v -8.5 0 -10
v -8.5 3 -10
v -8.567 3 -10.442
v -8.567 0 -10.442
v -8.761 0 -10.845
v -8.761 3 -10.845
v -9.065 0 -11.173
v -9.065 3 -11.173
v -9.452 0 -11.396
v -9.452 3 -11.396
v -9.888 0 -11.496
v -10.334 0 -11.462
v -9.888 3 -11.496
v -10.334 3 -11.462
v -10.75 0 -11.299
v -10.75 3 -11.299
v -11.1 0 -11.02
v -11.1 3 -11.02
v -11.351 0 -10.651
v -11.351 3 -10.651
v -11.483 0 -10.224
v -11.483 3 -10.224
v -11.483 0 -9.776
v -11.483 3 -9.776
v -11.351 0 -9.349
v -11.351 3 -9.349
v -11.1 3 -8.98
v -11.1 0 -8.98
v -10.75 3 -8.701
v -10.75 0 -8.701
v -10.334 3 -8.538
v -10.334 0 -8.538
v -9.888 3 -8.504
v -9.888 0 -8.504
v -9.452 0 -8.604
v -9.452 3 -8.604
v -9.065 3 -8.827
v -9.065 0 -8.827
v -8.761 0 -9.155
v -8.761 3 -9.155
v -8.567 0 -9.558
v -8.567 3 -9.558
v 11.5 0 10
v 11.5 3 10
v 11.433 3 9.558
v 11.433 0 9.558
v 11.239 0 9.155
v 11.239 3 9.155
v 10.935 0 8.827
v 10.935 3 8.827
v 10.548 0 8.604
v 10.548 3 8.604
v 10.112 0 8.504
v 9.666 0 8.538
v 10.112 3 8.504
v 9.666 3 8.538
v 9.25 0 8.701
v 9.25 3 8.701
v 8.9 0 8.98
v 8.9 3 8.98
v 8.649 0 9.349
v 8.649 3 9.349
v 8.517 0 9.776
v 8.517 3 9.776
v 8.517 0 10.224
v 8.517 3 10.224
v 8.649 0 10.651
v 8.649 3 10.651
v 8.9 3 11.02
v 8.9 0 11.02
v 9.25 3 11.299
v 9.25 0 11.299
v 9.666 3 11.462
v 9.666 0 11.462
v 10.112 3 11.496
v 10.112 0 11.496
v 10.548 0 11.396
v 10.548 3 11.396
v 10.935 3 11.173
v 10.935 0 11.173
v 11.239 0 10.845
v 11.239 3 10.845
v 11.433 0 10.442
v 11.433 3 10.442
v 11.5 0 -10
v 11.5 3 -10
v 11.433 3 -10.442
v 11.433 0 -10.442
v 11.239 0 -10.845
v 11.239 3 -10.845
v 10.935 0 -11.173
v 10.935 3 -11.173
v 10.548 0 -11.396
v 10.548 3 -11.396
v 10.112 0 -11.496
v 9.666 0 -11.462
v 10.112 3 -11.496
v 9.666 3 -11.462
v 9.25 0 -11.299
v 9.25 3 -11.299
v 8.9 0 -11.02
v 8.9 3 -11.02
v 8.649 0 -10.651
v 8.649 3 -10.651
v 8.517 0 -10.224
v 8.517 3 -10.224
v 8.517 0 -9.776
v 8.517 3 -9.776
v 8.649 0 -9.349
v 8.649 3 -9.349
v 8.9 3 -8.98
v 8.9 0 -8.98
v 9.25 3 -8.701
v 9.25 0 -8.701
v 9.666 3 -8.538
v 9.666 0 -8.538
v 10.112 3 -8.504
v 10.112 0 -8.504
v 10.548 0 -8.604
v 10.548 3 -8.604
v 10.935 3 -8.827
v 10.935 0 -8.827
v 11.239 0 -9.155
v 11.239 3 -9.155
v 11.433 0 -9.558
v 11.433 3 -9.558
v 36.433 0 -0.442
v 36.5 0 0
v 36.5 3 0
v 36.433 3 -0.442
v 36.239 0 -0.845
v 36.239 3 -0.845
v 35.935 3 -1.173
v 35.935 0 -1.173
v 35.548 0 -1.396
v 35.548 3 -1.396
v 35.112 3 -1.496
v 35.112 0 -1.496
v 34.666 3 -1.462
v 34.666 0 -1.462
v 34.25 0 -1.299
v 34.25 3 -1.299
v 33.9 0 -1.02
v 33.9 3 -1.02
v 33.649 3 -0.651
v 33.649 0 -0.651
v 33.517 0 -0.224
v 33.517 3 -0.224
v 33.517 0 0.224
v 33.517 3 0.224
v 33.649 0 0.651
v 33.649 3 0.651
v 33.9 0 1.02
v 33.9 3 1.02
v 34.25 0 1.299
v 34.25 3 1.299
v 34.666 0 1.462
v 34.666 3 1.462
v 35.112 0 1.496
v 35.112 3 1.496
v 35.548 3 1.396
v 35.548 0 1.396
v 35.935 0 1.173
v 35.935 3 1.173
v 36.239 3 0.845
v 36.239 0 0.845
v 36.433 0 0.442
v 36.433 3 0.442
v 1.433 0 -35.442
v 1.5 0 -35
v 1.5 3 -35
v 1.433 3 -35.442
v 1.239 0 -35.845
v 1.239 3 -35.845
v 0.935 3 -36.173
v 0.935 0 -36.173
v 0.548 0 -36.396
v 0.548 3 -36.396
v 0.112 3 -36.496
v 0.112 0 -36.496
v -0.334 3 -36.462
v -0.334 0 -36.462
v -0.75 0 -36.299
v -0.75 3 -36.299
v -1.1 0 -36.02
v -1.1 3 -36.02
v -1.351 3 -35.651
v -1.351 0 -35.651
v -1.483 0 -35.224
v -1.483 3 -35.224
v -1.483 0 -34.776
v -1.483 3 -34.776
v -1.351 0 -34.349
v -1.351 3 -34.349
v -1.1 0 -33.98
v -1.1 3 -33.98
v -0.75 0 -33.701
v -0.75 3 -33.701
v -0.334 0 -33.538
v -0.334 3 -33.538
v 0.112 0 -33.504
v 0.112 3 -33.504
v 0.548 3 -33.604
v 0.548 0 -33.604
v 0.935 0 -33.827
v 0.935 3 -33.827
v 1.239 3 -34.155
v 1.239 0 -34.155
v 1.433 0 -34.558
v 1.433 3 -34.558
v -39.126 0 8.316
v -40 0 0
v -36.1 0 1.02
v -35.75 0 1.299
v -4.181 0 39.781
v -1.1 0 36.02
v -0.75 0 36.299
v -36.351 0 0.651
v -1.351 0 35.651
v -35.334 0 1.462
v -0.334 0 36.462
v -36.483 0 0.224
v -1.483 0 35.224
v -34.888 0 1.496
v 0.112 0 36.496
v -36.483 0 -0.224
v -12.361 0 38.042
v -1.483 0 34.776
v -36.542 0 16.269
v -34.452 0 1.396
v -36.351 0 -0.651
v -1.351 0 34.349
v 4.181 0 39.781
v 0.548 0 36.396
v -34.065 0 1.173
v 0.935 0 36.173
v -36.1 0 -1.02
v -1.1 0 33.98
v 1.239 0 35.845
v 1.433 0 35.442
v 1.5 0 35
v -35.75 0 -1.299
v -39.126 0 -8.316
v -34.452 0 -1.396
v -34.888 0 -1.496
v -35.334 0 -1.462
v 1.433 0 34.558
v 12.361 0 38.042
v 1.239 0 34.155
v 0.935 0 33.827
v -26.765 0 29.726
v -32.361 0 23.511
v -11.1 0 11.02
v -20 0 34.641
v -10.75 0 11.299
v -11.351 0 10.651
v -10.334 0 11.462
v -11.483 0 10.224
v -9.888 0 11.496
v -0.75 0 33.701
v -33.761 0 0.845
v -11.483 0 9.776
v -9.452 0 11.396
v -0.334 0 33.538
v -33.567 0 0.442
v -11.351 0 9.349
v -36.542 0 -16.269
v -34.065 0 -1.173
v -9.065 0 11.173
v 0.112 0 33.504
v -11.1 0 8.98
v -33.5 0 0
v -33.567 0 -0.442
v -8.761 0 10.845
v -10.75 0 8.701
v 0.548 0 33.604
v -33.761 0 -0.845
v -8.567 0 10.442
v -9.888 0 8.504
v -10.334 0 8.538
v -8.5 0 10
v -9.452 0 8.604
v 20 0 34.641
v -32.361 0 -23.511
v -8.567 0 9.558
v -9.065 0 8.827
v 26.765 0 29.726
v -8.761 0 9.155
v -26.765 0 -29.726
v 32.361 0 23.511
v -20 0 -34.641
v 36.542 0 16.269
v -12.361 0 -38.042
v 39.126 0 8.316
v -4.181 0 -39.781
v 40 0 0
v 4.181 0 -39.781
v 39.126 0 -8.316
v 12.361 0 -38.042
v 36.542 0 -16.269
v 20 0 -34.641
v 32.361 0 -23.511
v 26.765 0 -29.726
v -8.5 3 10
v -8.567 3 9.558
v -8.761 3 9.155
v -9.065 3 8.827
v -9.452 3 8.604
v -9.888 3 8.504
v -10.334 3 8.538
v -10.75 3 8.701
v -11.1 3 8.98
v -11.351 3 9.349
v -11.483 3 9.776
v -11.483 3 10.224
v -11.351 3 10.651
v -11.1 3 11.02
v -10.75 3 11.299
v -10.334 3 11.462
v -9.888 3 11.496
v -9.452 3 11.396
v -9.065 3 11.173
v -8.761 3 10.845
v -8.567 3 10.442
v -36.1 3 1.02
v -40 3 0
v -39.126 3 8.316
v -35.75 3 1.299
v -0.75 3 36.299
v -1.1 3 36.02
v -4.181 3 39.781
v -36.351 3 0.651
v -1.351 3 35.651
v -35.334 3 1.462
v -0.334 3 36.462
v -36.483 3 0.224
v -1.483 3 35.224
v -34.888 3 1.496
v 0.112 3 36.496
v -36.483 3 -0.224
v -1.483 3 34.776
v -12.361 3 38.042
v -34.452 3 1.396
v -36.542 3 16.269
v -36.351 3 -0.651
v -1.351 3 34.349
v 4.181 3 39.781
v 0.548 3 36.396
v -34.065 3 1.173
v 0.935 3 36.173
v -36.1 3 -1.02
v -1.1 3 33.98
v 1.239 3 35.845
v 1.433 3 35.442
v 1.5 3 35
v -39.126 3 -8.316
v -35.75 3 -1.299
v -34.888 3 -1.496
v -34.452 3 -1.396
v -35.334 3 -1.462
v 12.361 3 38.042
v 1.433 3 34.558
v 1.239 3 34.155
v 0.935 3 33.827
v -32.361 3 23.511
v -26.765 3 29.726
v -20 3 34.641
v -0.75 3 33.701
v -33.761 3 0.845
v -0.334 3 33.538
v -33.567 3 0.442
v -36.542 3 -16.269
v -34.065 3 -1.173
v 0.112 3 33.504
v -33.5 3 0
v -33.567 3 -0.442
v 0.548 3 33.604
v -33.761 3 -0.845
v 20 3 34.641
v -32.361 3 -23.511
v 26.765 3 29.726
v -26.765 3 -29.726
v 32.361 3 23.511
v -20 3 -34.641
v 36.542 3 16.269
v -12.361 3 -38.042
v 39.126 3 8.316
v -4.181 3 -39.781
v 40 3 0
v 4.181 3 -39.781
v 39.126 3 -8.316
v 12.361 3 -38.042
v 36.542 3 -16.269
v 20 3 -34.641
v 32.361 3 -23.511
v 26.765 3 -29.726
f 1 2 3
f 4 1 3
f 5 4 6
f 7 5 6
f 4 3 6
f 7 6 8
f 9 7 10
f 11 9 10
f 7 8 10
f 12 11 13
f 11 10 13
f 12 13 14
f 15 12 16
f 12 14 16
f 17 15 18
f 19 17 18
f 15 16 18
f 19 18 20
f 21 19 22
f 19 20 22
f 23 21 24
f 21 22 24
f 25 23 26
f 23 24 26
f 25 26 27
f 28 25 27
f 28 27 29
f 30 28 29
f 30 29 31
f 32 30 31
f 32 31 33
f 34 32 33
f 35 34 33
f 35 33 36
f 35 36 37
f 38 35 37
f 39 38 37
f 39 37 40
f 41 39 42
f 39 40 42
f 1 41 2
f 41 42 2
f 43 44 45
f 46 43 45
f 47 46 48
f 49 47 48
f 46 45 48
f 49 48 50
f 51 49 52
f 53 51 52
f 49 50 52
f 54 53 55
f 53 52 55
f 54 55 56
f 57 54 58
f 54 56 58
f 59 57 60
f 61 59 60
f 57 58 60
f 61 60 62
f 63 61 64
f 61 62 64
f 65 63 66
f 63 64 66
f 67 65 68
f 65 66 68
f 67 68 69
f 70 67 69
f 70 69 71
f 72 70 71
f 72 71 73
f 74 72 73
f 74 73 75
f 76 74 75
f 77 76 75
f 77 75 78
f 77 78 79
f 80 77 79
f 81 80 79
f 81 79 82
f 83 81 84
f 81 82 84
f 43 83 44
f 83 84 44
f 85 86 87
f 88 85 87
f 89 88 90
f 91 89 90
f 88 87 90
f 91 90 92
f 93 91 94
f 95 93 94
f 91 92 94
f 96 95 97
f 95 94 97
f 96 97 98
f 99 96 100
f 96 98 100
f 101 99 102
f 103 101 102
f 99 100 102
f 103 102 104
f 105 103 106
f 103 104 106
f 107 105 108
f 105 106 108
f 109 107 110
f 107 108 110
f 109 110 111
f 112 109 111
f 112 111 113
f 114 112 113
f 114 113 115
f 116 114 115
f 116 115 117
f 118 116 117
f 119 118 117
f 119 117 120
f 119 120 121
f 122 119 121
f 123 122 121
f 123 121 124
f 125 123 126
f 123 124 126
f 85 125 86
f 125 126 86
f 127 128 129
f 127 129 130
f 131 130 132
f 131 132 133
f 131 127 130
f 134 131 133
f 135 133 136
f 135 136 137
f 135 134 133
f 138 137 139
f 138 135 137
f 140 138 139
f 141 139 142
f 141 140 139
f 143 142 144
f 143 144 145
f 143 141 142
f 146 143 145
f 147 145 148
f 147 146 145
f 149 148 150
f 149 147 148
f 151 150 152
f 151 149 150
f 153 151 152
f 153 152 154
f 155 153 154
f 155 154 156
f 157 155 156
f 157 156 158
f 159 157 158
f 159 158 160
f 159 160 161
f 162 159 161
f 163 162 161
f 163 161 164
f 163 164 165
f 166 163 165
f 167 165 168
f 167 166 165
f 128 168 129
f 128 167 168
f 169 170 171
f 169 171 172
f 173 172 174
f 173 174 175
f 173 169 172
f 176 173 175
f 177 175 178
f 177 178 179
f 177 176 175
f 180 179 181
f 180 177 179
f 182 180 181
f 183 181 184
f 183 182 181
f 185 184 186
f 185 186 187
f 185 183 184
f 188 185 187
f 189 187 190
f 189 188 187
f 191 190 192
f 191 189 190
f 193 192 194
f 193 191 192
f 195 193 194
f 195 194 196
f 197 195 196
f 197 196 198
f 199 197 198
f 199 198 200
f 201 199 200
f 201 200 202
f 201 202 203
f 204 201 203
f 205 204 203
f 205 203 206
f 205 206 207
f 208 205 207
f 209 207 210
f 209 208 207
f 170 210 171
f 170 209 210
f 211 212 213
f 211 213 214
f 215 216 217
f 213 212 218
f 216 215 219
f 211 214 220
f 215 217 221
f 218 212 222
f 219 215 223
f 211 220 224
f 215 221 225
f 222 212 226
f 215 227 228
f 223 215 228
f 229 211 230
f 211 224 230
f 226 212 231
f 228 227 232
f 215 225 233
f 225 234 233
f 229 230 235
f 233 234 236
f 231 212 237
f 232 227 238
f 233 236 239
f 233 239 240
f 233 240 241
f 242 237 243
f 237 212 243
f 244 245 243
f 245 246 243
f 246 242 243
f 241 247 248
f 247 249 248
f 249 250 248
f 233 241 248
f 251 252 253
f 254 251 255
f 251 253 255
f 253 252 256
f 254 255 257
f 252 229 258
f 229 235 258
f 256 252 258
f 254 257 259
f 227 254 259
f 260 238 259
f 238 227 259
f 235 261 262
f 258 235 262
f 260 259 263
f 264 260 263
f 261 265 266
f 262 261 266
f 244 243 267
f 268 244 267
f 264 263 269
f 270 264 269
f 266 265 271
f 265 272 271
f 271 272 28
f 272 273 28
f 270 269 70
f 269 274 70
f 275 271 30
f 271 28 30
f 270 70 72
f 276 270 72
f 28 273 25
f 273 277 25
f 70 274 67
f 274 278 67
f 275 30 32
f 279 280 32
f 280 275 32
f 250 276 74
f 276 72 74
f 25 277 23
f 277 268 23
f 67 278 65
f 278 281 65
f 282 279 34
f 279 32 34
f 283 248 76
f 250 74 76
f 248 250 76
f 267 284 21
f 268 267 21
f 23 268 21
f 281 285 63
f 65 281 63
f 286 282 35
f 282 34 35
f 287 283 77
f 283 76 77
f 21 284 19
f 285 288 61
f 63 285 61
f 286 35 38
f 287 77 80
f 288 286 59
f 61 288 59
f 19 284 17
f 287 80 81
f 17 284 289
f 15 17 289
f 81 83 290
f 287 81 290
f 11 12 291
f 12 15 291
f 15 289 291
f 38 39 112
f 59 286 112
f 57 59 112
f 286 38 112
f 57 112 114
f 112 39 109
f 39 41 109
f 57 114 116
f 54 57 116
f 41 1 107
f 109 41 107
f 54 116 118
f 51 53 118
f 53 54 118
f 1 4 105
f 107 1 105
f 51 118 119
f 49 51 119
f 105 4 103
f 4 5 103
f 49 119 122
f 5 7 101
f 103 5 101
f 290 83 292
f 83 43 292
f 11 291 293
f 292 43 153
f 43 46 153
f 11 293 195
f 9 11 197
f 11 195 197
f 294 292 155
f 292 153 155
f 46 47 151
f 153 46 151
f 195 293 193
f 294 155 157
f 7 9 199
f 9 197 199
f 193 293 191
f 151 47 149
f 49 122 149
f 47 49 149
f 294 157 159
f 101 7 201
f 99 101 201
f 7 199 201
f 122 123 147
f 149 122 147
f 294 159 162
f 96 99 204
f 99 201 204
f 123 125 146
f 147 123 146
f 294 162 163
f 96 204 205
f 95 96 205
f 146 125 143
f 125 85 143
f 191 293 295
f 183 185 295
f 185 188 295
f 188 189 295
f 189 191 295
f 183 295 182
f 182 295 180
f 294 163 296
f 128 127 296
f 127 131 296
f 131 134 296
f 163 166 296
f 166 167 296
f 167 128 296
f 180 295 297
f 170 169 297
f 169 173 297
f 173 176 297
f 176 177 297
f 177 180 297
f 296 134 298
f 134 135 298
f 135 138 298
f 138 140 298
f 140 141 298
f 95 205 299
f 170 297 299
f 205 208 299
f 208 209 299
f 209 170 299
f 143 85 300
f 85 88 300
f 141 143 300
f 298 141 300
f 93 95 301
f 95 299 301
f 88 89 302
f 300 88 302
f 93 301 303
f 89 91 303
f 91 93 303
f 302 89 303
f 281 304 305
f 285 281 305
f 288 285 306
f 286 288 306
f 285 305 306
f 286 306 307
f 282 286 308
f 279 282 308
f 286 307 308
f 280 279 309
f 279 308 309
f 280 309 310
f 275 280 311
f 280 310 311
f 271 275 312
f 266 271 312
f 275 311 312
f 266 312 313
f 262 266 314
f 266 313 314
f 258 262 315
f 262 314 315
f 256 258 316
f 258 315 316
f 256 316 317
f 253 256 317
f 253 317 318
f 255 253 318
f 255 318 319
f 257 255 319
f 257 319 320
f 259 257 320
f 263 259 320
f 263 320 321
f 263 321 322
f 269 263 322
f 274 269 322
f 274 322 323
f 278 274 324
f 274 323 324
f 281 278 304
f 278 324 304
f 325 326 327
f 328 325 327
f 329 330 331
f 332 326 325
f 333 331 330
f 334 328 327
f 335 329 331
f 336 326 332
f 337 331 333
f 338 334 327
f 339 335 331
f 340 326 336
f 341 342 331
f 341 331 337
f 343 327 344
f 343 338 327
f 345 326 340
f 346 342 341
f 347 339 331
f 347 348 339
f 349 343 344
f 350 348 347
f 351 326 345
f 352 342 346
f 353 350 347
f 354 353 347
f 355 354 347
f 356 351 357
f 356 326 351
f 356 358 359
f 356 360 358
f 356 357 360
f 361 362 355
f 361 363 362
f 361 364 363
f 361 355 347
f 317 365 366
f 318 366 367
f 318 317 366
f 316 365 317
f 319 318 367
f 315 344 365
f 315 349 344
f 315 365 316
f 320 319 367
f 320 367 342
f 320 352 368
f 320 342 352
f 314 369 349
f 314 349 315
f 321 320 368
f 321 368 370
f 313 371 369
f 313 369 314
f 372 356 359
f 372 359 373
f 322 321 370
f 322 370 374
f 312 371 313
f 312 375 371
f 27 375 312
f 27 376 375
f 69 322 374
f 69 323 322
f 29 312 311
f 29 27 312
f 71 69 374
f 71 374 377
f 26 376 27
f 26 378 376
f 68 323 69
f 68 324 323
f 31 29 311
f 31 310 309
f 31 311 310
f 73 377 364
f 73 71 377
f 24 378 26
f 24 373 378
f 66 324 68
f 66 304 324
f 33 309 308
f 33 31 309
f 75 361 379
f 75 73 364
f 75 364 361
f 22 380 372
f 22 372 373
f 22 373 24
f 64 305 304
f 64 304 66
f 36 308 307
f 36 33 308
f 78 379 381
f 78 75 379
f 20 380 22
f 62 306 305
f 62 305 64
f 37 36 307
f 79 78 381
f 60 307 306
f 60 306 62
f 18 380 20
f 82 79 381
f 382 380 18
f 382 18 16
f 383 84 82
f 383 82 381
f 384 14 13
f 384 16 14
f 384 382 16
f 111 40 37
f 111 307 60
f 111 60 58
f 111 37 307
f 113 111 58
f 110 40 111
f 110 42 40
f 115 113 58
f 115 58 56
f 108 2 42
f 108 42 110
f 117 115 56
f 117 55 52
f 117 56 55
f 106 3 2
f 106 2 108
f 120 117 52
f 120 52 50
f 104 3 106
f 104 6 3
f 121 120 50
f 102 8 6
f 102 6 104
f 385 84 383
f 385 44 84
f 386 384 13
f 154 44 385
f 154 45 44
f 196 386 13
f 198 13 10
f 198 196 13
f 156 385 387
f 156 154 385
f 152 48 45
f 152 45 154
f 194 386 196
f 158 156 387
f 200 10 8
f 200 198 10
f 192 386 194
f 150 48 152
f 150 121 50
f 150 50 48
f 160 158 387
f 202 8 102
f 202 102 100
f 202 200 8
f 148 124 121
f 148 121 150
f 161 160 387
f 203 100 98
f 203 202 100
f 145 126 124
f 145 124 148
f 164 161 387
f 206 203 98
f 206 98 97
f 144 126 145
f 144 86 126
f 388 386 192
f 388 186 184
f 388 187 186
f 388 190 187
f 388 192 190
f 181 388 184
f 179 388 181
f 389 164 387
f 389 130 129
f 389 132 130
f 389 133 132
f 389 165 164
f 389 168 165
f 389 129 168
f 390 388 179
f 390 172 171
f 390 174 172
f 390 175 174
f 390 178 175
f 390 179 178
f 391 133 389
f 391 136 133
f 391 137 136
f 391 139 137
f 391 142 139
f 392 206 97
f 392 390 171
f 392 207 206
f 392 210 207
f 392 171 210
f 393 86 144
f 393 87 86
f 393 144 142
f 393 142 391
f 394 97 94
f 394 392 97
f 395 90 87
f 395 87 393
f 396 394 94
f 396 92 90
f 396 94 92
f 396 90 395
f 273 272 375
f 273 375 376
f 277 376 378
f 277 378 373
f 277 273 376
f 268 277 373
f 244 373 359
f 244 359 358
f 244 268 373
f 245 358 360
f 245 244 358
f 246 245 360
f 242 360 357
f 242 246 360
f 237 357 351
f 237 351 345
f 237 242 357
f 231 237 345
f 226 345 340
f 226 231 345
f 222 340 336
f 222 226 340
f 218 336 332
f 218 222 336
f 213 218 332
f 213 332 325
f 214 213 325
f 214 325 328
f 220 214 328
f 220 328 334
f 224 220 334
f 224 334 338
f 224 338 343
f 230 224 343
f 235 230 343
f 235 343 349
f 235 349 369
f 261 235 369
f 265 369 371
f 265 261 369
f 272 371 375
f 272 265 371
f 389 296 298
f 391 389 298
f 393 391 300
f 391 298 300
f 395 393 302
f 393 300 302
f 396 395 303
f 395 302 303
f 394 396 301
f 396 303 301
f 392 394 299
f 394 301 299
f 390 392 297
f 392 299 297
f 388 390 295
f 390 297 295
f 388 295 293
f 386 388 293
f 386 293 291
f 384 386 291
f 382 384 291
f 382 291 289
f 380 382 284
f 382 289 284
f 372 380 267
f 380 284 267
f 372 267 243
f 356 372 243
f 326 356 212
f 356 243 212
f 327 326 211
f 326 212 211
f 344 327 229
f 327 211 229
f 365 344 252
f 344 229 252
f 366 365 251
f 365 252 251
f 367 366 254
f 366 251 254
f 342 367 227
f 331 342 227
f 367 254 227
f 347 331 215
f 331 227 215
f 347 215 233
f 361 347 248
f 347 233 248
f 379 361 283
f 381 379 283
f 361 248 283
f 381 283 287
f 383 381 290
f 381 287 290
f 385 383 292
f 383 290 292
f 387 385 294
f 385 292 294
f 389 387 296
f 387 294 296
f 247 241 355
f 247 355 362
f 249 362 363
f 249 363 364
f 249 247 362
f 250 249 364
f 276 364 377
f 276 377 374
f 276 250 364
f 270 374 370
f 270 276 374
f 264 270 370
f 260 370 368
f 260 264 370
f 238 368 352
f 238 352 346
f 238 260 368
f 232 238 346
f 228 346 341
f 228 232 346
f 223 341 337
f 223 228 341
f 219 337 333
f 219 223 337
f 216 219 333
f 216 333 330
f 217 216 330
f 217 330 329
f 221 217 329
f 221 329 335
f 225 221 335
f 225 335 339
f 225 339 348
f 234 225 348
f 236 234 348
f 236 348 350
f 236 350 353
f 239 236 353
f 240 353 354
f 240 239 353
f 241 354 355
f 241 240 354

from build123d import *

# Parameters (mm, degrees)
SKETCH1_R           = 40
SKETCH1_R_2         = 1.5
BOSS_EXTRUDE1_DEPTH = 3
SKETCH2_R           = 1.5
CUT_EXTRUDE1_DEPTH  = 3


with BuildPart() as part:
    # Sketch1 → Boss-Extrude1 (new body)
    with BuildSketch(Plane(origin=(0, 0, 0), x_dir=(1, 0, 0), z_dir=(0, 1, 0))):
        Circle(SKETCH1_R)
        with Locations((0, 35)):
            Circle(SKETCH1_R_2, mode=Mode.SUBTRACT)
        with Locations((35, 0)):
            Circle(SKETCH1_R_2, mode=Mode.SUBTRACT)
        with Locations((0, -35)):
            Circle(SKETCH1_R_2, mode=Mode.SUBTRACT)
        with Locations((-35, 0)):
            Circle(SKETCH1_R_2, mode=Mode.SUBTRACT)
    extrude(amount=BOSS_EXTRUDE1_DEPTH)

    # Sketch2 → Cut-Extrude1 (cut)
    with BuildSketch(Plane(origin=(0, 3, 0), x_dir=(1, 0, 0), z_dir=(0, 1, 0))):
        with Locations((10, 10)):
            Circle(SKETCH2_R)
        with Locations((-10, 10)):
            Circle(SKETCH2_R)
        with Locations((-10, -10)):
            Circle(SKETCH2_R)
        with Locations((10, -10)):
            Circle(SKETCH2_R)
    extrude(amount=-CUT_EXTRUDE1_DEPTH, mode=Mode.SUBTRACT)


solid = part.part
